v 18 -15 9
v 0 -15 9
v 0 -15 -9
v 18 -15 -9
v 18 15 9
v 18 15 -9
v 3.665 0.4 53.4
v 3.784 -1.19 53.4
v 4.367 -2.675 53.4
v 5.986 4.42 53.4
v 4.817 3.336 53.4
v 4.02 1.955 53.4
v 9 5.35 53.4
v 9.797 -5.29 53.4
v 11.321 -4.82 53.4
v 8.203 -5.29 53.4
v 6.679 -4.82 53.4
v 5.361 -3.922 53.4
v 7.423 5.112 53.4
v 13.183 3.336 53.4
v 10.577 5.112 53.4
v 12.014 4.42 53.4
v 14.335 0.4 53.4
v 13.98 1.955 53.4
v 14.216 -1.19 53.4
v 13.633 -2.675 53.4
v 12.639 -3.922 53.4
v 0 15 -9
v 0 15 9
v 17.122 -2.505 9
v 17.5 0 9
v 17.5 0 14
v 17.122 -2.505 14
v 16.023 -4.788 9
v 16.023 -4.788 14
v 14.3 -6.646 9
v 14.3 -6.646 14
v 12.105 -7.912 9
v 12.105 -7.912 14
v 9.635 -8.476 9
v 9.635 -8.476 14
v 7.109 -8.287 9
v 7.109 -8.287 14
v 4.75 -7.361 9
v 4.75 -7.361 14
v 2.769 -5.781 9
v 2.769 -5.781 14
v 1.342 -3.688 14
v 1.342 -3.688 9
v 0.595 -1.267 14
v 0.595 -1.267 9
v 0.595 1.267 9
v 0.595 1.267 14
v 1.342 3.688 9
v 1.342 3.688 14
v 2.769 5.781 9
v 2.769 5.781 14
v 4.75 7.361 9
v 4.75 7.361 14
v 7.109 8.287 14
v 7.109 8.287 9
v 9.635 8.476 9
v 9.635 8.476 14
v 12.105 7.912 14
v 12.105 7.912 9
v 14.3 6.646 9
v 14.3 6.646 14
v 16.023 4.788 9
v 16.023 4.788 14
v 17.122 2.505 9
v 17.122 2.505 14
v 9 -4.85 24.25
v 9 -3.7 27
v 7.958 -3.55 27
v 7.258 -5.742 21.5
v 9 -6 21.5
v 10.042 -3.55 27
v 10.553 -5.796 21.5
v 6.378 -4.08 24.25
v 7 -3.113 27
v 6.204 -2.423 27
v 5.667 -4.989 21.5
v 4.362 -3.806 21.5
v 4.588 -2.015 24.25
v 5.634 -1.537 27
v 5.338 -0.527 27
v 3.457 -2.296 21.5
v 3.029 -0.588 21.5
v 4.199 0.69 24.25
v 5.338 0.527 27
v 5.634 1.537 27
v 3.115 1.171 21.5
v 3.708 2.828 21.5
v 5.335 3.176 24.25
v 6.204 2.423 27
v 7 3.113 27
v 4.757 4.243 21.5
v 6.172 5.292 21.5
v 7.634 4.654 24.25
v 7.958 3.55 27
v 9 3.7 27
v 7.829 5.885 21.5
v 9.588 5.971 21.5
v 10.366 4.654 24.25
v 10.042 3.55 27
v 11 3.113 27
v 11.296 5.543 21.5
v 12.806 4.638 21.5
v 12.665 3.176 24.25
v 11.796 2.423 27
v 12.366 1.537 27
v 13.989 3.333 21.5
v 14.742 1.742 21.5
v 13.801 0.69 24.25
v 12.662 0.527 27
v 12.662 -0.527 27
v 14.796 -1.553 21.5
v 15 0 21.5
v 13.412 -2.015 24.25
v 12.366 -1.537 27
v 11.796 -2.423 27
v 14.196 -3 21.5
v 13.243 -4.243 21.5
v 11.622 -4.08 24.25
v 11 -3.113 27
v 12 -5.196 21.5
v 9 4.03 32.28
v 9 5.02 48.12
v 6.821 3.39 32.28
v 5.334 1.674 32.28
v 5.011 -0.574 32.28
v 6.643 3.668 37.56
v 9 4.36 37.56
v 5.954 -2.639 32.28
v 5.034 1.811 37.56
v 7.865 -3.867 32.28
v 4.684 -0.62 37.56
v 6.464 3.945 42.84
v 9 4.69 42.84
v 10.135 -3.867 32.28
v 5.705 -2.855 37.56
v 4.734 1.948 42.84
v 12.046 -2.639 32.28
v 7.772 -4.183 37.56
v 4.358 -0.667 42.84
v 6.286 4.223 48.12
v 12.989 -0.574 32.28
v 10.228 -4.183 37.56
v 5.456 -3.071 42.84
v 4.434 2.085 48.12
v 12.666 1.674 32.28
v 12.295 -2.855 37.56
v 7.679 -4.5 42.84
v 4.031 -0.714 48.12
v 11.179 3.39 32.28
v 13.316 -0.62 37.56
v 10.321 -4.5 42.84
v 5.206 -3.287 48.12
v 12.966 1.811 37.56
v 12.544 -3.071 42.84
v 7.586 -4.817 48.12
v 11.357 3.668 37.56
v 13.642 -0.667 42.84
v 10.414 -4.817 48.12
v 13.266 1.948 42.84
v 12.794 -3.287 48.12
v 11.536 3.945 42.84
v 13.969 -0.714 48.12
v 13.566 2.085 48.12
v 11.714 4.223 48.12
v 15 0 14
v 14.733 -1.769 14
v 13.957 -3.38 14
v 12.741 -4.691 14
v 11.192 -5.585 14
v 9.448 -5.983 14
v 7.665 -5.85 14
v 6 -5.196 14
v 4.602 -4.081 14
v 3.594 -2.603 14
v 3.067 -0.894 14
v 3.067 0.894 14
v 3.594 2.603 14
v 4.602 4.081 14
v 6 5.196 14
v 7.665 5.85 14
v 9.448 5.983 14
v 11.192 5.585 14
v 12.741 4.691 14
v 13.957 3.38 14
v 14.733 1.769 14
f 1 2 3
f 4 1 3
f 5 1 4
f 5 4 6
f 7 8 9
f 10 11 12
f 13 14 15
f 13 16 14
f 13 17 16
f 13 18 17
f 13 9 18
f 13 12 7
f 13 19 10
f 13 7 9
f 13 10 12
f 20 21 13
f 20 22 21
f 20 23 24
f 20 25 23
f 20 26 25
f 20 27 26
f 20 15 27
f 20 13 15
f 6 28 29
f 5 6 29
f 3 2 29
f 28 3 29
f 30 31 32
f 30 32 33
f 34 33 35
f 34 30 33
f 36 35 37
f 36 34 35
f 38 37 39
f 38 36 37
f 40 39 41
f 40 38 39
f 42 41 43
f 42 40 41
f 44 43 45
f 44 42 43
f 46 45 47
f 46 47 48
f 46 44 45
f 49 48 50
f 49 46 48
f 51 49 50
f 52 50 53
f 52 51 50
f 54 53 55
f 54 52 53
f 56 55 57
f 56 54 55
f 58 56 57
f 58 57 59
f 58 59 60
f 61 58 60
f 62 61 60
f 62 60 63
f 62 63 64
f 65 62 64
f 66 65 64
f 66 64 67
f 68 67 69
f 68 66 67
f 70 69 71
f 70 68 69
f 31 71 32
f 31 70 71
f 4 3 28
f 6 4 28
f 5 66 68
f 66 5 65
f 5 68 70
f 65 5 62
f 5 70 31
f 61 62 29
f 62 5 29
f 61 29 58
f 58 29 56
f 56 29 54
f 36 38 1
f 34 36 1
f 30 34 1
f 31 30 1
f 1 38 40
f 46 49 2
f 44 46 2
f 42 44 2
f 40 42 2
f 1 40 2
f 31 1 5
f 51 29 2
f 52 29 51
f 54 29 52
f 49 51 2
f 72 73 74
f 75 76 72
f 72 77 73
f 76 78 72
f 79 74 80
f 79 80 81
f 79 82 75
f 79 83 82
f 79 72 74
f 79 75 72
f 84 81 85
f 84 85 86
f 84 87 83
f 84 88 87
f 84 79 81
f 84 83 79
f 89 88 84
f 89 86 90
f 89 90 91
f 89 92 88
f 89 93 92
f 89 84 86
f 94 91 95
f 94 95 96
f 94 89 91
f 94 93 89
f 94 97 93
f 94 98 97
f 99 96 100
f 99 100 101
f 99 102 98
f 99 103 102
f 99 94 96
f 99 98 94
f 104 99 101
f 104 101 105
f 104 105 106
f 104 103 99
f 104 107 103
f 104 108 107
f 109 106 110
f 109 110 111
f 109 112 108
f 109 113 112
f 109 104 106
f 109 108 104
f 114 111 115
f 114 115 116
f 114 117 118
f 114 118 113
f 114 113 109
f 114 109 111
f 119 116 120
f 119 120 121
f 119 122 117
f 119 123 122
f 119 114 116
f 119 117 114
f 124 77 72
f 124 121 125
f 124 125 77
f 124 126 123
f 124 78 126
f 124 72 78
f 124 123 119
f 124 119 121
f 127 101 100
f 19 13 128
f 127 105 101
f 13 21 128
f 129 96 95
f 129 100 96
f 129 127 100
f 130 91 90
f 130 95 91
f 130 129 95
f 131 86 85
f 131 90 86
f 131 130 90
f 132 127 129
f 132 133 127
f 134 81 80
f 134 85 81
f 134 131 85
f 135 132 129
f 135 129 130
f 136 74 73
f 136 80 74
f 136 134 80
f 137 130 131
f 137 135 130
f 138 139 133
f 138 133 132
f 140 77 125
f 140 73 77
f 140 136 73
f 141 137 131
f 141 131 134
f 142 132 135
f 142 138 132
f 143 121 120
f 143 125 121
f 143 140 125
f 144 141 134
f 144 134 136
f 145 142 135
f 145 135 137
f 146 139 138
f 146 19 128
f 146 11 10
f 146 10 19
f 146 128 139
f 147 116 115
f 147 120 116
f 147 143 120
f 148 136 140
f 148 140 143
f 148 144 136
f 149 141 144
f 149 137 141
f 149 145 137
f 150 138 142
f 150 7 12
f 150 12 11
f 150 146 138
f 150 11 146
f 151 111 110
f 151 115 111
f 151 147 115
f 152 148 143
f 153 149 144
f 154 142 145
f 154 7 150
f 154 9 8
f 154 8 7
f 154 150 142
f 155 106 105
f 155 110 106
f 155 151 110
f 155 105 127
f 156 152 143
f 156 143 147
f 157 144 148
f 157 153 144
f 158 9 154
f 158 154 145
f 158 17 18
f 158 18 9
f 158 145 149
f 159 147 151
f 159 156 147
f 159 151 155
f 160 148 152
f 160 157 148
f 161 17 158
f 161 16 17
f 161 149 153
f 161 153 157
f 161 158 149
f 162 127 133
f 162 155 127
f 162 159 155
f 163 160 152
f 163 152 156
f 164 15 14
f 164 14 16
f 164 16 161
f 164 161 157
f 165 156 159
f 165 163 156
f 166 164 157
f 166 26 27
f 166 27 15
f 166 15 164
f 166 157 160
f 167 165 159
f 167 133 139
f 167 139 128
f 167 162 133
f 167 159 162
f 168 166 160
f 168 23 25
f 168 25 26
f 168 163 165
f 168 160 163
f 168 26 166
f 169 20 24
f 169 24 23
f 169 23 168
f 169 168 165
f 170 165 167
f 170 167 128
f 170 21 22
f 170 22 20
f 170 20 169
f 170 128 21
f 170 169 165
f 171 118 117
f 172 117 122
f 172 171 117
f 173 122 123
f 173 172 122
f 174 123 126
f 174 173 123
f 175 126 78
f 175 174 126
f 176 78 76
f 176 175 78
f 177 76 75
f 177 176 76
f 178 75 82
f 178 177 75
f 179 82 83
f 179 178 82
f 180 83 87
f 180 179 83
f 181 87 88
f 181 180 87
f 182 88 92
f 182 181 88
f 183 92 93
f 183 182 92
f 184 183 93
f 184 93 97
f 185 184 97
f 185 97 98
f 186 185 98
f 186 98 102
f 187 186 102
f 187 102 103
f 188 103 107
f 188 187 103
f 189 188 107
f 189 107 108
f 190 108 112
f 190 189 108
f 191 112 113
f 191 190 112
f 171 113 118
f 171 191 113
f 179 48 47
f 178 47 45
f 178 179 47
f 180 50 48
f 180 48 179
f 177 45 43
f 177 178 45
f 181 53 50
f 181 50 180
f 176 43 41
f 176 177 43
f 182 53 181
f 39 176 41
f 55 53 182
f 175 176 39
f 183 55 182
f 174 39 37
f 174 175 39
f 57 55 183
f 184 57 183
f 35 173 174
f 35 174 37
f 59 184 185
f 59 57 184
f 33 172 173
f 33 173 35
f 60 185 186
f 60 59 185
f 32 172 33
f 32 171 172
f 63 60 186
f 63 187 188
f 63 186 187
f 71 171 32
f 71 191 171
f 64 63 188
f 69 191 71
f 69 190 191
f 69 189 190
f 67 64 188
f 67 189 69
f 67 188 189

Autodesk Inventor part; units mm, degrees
ref_plane "YZ Plane" through (0, 0, 0) normal (1, 0, 0) x (0, 1, 0)
ref_plane "XZ Plane" through (0, 0, 0) normal (0, 1, 0) x (-1, 0, 0)
sketch "Sketch1" plane through (0, 0, 0) normal (1, 0, 0) x (0, 1, 0)
  point P0 (0, 0)
sketch "Sketch2" plane through (0, 0, 0) normal (1, 0, 0) x (0, 1, 0)
  line L0 (15, 9) -> (-15, 9)
  line L1 (-15, 9) -> (-15, -9)
  line L2 (-15, -9) -> (15, -9)
  line L3 (15, -9) -> (15, 9)
  line L4 (15, 9) -> (-15, -9) construction
  line L5 (-15, 9) -> (15, -9) construction
  point P0 (0, 0)
  dimension "d0" = 30
  dimension "d1" = 18
extrude "Extrusion1" add sketch "Sketch2" along normal blind 18
sketch "Sketch3" plane through (0, -15, 9) normal (0, 0, 1) x (1, 0, 0)
  line L0 (18, 0) -> (18, 30) projected
  line L1 (0, 0) -> (0, 30) projected
  line L2 (18, 0) -> (0, 30)
  line L3 (0, 0) -> (18, 0) projected
  line L4 (0, 30) -> (0, 0)
  line L5 (0, 0) -> (18, 30)
  circle A0 centre (9, 15) radius 8.5
  point P0 (0, 15)
  dimension "d4" = 17
extrude "Extrusion2" add sketch "Sketch3" along normal blind 5 contours A0 L5 L2 | L2 L5 A0 | L5 L2 A0 | L5 A0 L2
sketch "Sketch4" plane through (9, 0, 14) normal (0, 0, 1) x (1, 0, 0)
  circle A0 centre (0, 0) radius 6
  point P0 (-9, 0)
  dimension "d7" = 12
extrude "Extrusion3" add sketch "Sketch4" along normal blind 7.5
sketch "Sketch5" plane through (9, 0, 21.5) normal (0, 0, 1) x (1, 0, 0)
  circle A0 centre (0, 0) radius 6
  point P0 (-9, 0)
extrude "Extrusion4" add sketch "Sketch5" along normal blind 5.5
sketch "Sketch6" plane through (0, 0, 0) normal (1, 0, 0) x (0, 1, 0)
  point P0 (0, 0)
ref_plane "Work Plane1" through (9, 0, 0) normal (1, 0, 0) x (0, 0, -1)
sketch "Sketch7" plane through (9, 0, 0) normal (1, 0, 0) x (0, 0, -1)
  line L0 (-27, 6) -> (-27, -6) projected
  line L1 (-27, 0) -> (-27, 3.7)
  line L2 (-27, 0) -> (-27, -3.7)
  line L3 (-14, -6) -> (-14, 6) projected
  line L4 (-14, -6) -> (-21.5, -6)
  line L5 (-14, -6) -> (-27, -6) projected
  line L6 (-21.5, -6) -> (-27, -3.7)
  line L7 (-27, -6) -> (-27, -3.7)
  line L8 (-21.5, -6) -> (-27, -6)
  line L9 (-40.6184, 0) -> (-19.5493, 0)
  point P0 (0, 0)
  dimension "d12" = 3.7
  dimension "d13" = 3.7
  dimension "d14" = 7.5
revolve "Revolution1" cut sketch "Sketch7" angle 360 about axis through (9, 0, 40.6184) along (0, 0, -1)
sketch "Sketch8" plane through (9, 0, 27) normal (0, 0, 1) x (1, 0, 0)
  circle A0 centre (0, 0) radius 3.7 projected
  circle A1 centre (0, 0) radius 5.35
  point P0 (-9, 0)
  dimension "d16" = 10.7
extrude "Extrusion5" add sketch "Sketch8" along normal blind 26.4 contours A0 | A1
sketch "Sketch9" plane through (9, 0, 0) normal (1, 0, 0) x (0, 0, -1)
  line L0 (-27, 3.7) -> (-27, -3.7) projected
  line L1 (-27, 3.7) -> (-53.4, 5.35)
  line L2 (-27, 5.35) -> (-53.4, 5.35) projected
  line L3 (-27, 3.7) -> (-27, 5.35)
  line L4 (-66.1655, 0) -> (-43.0091, 0)
  line L5 (-53.4, 5.35) -> (-53.4, -5.35) projected
  point P0 (0, 0)
  point P1 (-53.4, 0)
revolve "Revolution2" cut sketch "Sketch9" angle 360 about axis through (9, 0, 66.1655) along (0, 0, -1)
thread "Thread1" size "M12x1" class "6g" standard "ANSI Metric M Profile" length 15.103
properties part number "NKK_S1AL" material "Stainless Steel"
